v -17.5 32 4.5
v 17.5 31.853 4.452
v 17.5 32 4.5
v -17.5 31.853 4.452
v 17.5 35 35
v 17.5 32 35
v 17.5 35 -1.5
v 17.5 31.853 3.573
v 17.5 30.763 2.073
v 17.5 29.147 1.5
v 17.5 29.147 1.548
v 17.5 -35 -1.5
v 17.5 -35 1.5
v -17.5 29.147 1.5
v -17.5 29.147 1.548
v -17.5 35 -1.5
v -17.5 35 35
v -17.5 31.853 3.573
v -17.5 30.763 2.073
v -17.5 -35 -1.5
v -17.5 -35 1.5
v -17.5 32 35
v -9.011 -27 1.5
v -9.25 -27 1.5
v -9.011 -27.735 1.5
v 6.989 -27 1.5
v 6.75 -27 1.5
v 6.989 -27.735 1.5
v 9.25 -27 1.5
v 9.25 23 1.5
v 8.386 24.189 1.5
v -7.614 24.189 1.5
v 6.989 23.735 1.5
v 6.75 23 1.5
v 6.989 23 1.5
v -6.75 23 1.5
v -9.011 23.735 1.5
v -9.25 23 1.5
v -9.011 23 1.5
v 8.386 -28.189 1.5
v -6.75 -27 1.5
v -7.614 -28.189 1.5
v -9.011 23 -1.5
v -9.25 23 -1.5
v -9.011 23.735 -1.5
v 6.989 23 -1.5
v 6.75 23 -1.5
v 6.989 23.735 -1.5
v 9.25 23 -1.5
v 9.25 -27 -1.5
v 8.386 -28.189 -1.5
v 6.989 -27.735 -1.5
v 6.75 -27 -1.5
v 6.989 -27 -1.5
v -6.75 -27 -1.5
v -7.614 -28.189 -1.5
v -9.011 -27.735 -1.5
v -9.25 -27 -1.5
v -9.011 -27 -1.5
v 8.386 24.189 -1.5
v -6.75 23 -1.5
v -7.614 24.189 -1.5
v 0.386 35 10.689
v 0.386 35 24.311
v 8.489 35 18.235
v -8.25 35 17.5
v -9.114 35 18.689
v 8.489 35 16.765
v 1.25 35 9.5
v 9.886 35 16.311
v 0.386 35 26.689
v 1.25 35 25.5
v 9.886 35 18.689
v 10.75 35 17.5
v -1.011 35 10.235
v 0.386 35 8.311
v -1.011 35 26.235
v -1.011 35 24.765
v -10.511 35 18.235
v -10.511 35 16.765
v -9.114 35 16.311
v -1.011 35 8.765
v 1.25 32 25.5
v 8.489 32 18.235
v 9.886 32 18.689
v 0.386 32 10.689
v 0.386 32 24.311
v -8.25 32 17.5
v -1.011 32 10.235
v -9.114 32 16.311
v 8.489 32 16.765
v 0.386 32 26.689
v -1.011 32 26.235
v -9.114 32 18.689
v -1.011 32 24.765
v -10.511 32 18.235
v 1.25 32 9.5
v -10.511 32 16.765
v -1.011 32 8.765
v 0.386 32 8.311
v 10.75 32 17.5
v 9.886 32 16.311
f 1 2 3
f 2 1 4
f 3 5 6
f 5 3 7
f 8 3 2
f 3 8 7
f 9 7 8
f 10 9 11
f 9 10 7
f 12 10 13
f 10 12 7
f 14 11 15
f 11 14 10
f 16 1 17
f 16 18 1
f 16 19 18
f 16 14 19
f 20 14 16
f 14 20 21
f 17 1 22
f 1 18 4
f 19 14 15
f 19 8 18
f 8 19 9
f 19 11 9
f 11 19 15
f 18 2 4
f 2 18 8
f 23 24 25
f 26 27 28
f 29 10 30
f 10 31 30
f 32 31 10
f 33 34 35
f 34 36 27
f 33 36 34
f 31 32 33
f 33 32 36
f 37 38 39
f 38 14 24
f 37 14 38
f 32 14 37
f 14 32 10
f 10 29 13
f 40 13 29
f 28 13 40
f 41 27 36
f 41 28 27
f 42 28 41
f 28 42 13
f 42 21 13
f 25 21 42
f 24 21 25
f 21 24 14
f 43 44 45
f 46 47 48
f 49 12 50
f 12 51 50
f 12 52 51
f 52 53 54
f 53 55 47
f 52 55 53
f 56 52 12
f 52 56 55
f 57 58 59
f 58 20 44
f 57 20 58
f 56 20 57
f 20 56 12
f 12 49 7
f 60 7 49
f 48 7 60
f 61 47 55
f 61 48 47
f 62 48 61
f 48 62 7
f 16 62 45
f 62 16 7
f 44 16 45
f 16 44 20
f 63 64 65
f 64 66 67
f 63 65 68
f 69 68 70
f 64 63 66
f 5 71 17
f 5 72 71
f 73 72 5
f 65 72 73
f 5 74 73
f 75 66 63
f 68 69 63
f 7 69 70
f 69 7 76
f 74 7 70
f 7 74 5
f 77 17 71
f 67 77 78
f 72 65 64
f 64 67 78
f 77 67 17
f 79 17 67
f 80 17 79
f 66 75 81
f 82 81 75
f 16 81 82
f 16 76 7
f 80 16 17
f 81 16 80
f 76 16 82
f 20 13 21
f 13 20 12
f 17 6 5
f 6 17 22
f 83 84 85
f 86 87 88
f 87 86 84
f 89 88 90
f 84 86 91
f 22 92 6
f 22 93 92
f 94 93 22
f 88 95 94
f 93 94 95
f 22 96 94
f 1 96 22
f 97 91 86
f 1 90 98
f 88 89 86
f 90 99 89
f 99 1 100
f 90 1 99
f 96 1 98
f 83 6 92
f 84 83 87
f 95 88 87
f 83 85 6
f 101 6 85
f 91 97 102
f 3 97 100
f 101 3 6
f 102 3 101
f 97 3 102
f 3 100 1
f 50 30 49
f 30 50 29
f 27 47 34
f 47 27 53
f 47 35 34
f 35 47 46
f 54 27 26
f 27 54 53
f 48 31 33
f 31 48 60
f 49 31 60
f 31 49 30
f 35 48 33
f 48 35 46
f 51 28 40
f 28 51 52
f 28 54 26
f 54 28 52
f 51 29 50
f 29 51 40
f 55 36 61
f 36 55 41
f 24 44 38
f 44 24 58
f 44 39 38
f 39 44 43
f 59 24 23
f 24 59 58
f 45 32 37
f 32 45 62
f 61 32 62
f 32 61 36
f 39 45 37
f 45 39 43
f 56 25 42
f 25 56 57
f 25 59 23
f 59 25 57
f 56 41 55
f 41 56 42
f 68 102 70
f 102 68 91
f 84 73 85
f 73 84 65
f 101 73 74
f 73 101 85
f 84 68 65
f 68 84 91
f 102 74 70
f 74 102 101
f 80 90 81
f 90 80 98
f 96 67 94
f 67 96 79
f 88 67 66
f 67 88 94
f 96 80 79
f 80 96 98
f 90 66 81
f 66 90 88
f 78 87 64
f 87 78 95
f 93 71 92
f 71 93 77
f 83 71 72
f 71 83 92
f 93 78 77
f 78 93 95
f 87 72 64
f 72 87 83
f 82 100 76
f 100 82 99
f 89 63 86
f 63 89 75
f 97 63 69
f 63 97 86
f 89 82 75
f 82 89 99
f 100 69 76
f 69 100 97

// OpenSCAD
module MotorMountHoles(depth) {
  mount_width = 19;
  mount_height = 16;
  screw_type = 2.5;

  translate([mount_width / 2.0, 0.0]) {
    #cylinder(r=screw_type / 2.0, h=depth, center=true);
  }
  translate([-mount_width / 2.0, 0.0]) {
    #cylinder(r=screw_type / 2.0, h=depth, center=true);
  }

  translate([0.0, mount_height / 2.0]) {
    #cylinder(r=screw_type / 2.0, h=depth, center=true);
  }
  translate([0.0, -mount_height / 2.0]) {
    #cylinder(r=screw_type / 2.0, h=depth, center=true);
  }
}

module GimbalBracket(width, length, depth) {
  cube([width, length, depth], center=true);
  translate([0.0, (length / 2.0) - depth / 2.0, width / 2.0]) {
    cube([width, depth, width], center=true);
  }

  // fillet
  translate([0, (length / 2.0) - depth, depth / 2.0]) {
      rotate([0, 90]) {
        difference() {
            cylinder(r=3, h=width, center=true);
            translate([-3.0, -3.0, 0.0]) {
              cylinder(r=3, h=width, center=true);
            }
        }
      }
  }
}

module MotorVariableMountHole(depth) {
  screw_type = 2.5;
  width = 50;
  height = 16;

  translate([height / 2.0, 0.0]) {
    cube([screw_type, width, depth], center=true);
    translate([0.0, width / 2.0]) {
      cylinder(r=screw_type / 2.0, h=depth, center=true);
    }
    translate([0.0, -width / 2.0]) {
      cylinder(r=screw_type / 2.0, h=depth, center=true);
    }
  }

  translate([-height / 2.0, 0.0]) {
    cube([screw_type, width, depth], center=true);
    translate([0.0, width / 2.0]) {
      cylinder(r=screw_type / 2.0, h=depth, center=true);
    }
    translate([0.0, -width / 2.0]) {
      cylinder(r=screw_type / 2.0, h=depth, center=true);
    }
  }
}

difference() {
  bracket_width = 35;
  bracket_length = 70;
  bracket_depth = 3;

  // gimbal bracket
  GimbalBracket(bracket_width, bracket_length, bracket_depth);

  // motor mount holes
  translate([0.0, -2.0]) {
    MotorVariableMountHole(bracket_depth + 0.01);
  }

  translate([0.0, (bracket_length / 2.0) - (bracket_depth / 2.0), bracket_width / 2.0]) {
    rotate([90.0, 0.0, 0.0]) {
      MotorMountHoles(bracket_depth + 0.01);
    }
  }
}
